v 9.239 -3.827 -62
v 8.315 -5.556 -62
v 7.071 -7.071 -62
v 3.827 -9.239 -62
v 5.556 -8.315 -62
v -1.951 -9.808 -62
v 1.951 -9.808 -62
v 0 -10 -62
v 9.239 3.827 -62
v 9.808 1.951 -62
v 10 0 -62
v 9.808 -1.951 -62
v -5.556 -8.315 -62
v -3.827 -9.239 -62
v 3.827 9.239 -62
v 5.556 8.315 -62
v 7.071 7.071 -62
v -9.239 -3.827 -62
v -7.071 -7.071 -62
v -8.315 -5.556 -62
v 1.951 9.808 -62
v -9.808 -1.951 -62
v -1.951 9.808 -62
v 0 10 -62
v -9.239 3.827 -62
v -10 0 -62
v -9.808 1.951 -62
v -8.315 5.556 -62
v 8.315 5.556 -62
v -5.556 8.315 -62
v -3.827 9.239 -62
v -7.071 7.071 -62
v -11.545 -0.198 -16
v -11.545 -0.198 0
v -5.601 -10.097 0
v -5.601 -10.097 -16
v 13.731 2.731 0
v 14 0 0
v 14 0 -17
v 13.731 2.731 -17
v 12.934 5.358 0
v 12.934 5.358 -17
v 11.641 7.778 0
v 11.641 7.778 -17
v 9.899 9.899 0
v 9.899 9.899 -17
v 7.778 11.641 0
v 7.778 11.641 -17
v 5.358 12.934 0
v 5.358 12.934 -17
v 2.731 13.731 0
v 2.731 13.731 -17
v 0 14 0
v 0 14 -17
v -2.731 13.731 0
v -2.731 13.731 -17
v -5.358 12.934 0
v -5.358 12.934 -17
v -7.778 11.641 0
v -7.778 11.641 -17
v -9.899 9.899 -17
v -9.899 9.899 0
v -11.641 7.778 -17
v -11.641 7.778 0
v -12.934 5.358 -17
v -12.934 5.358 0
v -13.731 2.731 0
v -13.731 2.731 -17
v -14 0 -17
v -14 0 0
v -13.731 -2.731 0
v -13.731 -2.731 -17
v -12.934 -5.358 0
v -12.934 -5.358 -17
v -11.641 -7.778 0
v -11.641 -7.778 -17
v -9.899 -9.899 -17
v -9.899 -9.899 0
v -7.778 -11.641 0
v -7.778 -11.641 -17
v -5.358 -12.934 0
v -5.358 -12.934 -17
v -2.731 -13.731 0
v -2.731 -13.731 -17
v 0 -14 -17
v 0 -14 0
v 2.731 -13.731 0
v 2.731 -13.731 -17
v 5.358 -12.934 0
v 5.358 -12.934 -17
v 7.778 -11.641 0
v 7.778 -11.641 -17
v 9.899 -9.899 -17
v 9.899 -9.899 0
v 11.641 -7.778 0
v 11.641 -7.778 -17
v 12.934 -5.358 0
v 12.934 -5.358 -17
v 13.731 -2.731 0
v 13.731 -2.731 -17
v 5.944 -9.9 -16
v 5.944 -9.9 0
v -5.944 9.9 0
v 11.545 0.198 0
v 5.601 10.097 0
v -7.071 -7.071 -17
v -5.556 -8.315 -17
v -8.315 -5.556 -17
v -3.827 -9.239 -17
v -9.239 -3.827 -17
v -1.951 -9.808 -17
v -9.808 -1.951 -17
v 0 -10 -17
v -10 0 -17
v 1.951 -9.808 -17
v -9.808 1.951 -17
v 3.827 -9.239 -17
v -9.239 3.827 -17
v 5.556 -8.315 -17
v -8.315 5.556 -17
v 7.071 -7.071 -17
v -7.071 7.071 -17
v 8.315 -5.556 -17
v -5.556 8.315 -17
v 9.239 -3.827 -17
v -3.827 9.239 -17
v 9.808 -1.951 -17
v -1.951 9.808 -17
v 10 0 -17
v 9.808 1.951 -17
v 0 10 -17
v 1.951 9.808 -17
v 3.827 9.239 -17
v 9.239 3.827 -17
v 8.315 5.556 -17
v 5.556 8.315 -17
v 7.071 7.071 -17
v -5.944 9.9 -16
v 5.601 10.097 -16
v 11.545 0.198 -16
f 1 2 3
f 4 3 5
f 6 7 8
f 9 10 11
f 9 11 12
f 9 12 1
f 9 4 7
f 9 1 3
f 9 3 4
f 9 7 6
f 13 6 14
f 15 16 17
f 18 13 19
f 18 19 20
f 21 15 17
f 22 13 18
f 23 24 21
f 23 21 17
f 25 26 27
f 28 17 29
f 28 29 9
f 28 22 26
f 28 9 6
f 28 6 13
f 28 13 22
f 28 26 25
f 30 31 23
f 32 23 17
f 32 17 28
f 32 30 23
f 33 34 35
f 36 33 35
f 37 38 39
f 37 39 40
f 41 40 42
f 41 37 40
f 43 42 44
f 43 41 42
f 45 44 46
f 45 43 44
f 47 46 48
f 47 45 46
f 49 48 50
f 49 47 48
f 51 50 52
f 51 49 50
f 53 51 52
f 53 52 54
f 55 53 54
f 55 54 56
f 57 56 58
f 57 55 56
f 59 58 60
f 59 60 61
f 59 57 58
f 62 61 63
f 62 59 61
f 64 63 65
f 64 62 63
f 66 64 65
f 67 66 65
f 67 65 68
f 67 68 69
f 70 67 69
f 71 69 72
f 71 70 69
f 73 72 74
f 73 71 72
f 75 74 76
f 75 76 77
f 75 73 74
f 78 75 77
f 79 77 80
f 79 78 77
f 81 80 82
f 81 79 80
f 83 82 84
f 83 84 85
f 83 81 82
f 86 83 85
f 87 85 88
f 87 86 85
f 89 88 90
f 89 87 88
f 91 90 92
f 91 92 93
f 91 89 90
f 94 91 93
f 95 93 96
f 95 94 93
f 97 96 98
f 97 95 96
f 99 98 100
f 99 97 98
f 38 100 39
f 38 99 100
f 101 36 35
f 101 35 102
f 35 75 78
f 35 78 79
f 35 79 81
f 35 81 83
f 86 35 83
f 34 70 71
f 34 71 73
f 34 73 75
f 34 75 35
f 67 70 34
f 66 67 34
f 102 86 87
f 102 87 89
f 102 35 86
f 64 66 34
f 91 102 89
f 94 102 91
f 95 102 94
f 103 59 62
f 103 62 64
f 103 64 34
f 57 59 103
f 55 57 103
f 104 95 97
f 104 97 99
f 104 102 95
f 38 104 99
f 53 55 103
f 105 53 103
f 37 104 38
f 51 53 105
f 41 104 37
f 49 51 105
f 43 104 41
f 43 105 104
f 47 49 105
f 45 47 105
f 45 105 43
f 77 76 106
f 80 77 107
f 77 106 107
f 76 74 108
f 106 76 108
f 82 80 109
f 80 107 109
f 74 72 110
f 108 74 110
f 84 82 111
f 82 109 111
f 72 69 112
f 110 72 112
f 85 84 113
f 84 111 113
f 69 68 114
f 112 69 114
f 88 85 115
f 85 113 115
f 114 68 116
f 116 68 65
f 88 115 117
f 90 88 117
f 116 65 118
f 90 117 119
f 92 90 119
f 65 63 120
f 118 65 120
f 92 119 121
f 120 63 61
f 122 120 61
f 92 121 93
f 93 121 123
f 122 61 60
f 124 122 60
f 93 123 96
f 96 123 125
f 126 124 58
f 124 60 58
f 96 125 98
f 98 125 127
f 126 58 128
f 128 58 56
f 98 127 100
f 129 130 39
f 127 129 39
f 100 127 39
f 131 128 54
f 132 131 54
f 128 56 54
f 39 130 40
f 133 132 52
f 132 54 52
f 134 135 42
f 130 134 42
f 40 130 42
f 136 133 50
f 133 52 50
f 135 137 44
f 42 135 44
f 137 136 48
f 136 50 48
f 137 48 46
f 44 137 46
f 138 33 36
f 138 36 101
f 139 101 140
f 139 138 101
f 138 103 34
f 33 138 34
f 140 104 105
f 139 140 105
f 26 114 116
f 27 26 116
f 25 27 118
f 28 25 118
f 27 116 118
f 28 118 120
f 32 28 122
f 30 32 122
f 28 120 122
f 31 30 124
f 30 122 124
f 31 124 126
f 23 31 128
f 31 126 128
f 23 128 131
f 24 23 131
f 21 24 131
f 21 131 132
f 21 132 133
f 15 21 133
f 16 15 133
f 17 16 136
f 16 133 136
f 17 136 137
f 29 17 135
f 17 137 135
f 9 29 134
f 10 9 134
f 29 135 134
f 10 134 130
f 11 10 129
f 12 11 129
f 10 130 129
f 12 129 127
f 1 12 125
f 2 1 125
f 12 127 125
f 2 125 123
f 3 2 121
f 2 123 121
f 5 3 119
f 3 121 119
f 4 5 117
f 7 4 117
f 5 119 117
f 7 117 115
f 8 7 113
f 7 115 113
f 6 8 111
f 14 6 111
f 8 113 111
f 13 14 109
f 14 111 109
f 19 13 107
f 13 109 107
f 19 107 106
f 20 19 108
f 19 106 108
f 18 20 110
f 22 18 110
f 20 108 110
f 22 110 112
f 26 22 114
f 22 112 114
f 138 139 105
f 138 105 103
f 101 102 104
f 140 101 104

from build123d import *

# Parameters (mm, degrees)
SKETCH1_R           = 14
BOSS_EXTRUDE1_DEPTH = 17
SKETCH2_R           = 10
BOSS_EXTRUDE2_DEPTH = 45
CUT_EXTRUDE1_DEPTH  = 16


with BuildPart() as part:
    # Sketch1 → Boss-Extrude1 (new body)
    with BuildSketch(Plane.XY):
        Circle(SKETCH1_R)
    extrude(amount=-BOSS_EXTRUDE1_DEPTH)

    # Sketch2 → Boss-Extrude2 (add)
    with BuildSketch(Plane(origin=(0, 0, -17), x_dir=(-1, 0, 0), z_dir=(0, 0, -1))):
        Circle(SKETCH2_R)
    extrude(amount=BOSS_EXTRUDE2_DEPTH)

    # Sketch3 → Cut-Extrude1 (cut)
    with BuildSketch(Plane.XY):
        Polygon((5.601358059, 10.097431417), (-5.943953091, 9.899634083), (-11.54531115, -0.197797334), (-5.601358059, -10.097431417), (5.943953091, -9.899634083), (11.54531115, 0.197797334), align=None)
    extrude(amount=-CUT_EXTRUDE1_DEPTH, mode=Mode.SUBTRACT)


solid = part.part
